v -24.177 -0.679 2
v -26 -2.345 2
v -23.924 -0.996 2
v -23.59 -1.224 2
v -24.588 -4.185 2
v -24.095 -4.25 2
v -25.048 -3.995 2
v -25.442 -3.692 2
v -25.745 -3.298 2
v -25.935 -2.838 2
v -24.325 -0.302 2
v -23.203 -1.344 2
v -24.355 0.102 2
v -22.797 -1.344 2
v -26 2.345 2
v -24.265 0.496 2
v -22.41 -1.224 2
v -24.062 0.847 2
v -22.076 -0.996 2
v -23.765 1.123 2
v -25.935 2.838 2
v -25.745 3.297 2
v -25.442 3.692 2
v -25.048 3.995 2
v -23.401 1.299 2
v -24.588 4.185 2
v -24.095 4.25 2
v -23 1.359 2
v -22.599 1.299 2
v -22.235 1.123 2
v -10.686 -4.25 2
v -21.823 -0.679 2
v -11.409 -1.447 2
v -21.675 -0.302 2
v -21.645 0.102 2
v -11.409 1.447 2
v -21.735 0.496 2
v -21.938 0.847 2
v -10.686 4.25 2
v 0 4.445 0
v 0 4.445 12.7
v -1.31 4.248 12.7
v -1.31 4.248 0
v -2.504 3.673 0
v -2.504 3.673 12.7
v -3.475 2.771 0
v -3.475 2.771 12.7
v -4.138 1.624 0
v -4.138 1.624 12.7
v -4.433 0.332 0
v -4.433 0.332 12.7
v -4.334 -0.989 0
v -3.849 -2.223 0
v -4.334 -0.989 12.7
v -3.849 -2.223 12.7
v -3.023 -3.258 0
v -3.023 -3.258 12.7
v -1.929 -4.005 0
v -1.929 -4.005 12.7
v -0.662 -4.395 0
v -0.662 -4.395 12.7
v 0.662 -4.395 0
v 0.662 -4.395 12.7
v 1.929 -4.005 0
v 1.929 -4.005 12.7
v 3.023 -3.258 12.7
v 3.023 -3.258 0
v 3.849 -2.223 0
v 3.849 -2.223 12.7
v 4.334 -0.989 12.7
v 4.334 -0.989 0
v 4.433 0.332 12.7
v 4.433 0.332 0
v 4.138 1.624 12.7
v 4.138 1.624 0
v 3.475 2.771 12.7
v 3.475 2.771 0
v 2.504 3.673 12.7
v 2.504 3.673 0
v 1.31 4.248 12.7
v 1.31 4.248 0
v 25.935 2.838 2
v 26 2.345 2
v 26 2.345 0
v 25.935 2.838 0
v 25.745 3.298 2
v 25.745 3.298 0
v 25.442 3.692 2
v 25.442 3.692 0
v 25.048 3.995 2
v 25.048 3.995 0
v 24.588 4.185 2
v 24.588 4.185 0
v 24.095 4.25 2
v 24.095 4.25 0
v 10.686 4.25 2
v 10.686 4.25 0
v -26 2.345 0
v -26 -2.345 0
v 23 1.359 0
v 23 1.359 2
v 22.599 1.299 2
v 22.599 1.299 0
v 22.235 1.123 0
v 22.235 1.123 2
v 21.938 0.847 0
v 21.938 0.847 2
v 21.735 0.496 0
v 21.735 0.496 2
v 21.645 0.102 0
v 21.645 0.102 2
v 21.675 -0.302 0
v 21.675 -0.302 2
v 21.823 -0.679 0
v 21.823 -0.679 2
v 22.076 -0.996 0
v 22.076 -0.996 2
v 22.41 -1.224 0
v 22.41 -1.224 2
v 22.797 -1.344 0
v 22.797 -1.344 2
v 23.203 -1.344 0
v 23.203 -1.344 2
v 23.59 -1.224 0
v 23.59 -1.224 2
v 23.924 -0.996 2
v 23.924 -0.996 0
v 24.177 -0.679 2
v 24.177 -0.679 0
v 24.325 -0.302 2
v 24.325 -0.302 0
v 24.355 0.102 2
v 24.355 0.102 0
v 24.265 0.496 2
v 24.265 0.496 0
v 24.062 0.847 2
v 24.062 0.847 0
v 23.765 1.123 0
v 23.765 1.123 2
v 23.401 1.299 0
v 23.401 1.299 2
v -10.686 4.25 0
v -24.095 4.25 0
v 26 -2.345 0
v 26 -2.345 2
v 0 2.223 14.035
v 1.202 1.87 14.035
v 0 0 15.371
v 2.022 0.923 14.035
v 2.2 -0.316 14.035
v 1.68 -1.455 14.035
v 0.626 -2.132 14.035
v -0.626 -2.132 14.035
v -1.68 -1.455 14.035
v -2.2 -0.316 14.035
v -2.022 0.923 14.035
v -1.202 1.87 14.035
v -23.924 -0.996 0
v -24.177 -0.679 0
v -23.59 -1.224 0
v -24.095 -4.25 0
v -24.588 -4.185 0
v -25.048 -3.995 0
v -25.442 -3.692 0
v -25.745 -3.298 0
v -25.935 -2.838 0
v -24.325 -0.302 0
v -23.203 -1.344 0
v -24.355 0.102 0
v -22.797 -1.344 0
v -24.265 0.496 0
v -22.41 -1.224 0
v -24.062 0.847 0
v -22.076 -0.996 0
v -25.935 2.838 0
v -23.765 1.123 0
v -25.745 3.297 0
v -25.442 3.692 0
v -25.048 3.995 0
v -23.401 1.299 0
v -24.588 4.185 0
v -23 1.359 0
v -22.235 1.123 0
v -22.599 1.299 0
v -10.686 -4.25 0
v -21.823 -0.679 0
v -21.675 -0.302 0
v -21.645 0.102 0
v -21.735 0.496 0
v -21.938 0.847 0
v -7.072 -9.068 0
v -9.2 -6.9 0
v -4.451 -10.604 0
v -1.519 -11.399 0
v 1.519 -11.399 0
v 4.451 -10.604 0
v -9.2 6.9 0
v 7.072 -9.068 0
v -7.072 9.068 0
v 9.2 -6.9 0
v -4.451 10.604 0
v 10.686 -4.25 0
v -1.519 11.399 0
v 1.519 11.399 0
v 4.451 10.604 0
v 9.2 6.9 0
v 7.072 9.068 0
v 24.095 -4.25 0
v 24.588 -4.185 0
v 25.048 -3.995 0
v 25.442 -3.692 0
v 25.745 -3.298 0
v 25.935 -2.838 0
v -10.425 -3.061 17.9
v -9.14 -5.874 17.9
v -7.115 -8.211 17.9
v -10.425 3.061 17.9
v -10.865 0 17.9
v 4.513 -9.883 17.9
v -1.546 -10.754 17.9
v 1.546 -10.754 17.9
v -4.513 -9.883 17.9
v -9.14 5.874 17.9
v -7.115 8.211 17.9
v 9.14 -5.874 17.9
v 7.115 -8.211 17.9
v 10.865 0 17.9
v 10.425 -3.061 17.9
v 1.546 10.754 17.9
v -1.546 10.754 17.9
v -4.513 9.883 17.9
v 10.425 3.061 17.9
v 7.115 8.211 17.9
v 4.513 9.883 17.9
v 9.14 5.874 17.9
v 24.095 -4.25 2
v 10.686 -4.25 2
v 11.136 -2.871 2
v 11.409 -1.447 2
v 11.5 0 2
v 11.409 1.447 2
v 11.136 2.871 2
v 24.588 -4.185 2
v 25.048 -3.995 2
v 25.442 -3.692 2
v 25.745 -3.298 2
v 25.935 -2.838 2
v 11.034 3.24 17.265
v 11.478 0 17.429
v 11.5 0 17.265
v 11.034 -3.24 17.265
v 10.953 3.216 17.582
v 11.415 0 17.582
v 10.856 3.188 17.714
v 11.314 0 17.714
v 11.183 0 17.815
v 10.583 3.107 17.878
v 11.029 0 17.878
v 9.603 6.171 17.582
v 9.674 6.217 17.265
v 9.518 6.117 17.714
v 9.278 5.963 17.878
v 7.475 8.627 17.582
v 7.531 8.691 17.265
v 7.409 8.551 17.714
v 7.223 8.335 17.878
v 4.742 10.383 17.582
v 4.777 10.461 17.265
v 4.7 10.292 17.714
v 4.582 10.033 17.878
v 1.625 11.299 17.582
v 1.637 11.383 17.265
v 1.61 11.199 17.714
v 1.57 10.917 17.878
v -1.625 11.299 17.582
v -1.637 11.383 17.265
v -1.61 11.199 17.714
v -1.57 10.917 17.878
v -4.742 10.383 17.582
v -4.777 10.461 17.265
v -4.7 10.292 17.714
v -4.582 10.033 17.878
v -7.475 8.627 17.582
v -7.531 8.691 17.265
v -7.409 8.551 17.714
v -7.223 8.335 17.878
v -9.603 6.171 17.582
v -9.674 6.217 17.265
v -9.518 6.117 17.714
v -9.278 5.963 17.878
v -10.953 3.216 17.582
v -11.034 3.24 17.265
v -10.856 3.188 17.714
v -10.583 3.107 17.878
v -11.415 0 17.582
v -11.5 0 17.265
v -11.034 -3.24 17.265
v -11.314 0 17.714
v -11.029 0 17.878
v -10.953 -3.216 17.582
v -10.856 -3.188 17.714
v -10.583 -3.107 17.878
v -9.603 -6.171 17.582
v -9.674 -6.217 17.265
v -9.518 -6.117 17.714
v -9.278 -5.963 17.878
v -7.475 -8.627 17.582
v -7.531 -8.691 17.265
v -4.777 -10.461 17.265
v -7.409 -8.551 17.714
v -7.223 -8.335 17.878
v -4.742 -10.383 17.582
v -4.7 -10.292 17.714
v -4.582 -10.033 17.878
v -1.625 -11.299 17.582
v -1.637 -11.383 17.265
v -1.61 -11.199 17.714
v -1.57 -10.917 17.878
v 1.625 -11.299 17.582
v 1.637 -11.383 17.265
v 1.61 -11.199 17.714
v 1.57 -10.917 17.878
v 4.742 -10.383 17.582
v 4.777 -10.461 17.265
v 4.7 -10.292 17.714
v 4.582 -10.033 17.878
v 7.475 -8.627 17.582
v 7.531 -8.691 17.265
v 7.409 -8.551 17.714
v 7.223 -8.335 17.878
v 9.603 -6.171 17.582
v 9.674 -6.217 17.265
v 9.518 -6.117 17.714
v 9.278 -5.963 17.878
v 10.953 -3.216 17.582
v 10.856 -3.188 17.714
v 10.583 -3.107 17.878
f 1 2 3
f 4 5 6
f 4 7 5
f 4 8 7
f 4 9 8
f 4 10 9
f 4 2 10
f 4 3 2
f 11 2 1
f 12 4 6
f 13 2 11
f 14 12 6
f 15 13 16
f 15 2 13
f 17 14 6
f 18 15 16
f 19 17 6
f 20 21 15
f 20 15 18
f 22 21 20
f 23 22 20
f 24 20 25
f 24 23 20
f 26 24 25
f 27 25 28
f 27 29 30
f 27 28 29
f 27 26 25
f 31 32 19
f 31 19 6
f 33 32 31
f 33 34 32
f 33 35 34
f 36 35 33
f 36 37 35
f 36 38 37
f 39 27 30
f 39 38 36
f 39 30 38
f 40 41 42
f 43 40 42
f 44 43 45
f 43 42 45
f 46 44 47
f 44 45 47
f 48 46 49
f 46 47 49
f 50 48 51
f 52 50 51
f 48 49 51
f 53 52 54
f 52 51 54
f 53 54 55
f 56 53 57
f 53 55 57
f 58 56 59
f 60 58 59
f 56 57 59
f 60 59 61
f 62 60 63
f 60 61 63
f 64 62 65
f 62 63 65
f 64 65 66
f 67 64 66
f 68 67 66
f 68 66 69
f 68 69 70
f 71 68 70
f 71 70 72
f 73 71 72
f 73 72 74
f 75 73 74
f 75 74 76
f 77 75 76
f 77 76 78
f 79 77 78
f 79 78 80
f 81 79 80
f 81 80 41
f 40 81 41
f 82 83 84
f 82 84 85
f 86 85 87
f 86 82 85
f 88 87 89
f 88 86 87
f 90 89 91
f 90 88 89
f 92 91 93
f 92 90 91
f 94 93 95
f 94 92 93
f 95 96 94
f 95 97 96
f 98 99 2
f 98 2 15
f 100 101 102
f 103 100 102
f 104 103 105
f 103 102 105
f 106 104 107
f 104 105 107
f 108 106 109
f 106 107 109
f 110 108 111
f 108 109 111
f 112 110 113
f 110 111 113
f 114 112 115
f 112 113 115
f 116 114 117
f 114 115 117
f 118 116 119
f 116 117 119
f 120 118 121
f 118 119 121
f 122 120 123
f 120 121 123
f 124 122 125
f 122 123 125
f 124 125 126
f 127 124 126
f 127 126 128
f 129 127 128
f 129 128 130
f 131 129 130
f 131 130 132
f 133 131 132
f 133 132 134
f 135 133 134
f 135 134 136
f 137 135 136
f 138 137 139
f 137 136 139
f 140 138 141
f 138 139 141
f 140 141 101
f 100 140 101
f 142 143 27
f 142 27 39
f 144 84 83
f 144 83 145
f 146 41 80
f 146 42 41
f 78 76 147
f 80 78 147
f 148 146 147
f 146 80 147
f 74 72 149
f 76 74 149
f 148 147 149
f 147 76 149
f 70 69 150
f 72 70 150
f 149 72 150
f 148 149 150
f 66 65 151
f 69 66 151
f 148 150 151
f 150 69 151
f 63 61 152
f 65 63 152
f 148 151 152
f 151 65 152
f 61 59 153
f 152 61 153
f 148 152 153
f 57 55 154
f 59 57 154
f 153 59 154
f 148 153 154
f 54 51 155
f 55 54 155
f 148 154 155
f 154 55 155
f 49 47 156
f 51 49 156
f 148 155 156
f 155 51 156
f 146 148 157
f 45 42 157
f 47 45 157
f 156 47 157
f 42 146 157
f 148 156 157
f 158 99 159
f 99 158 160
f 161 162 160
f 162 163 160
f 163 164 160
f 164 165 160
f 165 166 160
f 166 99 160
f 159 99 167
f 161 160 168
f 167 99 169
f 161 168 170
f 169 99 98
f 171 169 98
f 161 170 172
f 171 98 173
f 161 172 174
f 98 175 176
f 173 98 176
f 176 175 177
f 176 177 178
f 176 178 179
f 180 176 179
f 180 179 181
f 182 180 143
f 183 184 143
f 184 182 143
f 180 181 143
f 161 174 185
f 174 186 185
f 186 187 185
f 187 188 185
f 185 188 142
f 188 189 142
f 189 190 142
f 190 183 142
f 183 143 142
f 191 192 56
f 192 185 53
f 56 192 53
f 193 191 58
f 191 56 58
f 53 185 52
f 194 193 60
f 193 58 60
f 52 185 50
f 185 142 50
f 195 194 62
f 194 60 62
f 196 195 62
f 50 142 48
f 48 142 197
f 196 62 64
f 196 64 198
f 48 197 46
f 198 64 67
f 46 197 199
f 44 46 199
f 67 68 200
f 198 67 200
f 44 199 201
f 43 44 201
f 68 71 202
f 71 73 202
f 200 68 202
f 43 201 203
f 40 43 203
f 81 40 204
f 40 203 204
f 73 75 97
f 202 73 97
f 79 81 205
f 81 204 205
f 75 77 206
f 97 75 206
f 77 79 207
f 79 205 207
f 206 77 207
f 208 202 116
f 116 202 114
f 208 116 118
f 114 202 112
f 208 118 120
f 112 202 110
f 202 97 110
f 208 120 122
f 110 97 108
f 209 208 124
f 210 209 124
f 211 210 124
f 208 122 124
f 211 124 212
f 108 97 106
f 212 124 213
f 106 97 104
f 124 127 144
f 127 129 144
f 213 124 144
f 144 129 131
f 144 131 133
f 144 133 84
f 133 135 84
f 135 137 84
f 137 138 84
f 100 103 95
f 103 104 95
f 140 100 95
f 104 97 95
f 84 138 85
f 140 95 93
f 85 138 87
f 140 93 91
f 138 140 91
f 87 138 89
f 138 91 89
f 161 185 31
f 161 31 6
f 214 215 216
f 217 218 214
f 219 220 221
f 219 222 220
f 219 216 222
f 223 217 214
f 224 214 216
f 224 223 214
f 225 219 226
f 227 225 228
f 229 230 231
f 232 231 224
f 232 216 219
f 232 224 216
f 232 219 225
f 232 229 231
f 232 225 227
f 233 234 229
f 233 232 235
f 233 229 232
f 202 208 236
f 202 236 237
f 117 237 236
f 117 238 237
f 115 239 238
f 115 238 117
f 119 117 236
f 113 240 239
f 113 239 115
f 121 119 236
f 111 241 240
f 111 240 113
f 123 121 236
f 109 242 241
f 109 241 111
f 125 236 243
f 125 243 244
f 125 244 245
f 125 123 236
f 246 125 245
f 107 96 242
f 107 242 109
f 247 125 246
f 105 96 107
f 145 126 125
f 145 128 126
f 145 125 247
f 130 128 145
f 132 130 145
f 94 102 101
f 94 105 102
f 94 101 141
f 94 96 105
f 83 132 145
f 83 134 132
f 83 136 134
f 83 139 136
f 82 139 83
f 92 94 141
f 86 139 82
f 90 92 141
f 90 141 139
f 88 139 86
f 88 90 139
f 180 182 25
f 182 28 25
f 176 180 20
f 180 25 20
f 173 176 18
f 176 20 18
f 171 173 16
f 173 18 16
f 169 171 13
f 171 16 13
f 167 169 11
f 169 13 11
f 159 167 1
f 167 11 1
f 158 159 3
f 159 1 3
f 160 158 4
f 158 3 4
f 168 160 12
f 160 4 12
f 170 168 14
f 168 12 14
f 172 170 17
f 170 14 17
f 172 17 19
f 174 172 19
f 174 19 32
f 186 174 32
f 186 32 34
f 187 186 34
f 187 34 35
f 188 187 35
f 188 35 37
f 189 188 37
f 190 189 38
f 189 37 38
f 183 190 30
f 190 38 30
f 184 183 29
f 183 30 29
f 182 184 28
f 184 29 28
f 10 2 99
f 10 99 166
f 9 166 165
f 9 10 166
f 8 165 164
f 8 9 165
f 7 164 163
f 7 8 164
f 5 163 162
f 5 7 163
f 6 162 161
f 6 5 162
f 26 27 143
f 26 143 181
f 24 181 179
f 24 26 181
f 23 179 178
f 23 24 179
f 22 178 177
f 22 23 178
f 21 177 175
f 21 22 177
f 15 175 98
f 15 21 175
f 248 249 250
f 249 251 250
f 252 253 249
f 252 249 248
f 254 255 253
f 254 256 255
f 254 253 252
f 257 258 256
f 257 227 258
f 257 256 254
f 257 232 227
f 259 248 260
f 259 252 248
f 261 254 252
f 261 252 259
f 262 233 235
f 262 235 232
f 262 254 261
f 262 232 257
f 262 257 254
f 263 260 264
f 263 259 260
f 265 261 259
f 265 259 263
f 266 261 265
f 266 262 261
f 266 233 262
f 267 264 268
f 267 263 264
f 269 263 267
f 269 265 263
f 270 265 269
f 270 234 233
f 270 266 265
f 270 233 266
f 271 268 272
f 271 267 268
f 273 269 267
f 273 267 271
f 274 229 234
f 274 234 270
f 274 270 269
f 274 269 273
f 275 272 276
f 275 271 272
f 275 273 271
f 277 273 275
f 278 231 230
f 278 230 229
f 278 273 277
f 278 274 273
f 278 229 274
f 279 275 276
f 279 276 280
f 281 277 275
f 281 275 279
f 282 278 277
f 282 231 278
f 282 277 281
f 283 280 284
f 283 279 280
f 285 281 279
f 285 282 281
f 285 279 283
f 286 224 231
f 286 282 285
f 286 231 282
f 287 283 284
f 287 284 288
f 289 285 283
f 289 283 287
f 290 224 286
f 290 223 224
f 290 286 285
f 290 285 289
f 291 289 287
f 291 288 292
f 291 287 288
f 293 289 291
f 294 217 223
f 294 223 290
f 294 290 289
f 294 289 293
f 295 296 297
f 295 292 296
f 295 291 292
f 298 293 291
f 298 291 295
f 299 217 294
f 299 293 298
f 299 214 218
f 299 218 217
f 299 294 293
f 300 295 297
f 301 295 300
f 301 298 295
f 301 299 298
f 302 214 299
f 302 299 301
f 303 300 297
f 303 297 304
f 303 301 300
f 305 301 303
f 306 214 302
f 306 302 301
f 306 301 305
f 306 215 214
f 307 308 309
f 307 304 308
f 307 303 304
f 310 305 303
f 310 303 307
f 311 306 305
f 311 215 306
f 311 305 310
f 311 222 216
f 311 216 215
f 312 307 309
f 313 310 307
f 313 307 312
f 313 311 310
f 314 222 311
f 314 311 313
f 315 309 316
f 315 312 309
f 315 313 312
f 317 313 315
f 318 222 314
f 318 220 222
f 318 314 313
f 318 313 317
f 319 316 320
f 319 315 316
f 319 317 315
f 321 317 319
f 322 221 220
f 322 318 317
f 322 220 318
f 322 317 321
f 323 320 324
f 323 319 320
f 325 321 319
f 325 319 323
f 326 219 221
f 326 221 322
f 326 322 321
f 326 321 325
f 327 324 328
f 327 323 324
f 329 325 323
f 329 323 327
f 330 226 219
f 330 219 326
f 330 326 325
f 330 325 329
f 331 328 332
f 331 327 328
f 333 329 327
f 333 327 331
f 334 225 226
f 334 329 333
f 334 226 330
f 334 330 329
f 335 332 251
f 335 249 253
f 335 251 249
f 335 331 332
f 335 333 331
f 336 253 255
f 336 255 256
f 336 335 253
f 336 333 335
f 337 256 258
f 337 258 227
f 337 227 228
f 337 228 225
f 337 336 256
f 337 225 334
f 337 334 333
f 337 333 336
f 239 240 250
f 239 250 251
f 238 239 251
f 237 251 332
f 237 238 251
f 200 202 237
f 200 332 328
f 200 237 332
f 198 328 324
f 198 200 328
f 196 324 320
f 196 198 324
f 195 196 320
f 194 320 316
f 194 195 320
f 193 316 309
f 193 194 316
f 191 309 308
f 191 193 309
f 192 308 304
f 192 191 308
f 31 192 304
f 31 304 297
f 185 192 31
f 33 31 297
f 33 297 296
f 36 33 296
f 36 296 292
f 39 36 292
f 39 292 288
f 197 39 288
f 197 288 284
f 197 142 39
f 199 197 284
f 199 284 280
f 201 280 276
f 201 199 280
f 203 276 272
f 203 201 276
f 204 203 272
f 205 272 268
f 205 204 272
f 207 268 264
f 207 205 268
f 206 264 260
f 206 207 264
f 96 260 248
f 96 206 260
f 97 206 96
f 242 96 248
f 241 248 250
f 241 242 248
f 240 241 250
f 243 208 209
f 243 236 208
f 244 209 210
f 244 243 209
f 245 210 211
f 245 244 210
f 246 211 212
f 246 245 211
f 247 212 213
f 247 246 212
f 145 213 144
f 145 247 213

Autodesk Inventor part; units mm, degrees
ref_plane "YZ Plane" through (0, 0, 0) normal (1, 0, 0) x (0, 1, 0)
ref_plane "XZ Plane" through (0, 0, 0) normal (0, 1, 0) x (-1, 0, 0)
ref_plane "XY Plane" through (0, 0, 0) normal (0, 0, 1) x (1, 0, 0)
sketch "Sketch1" plane through (0, 0, 0) normal (0, 0, 1) x (1, 0, 0)
  circle A0 centre (0, 0) radius 11.5
  line L0 (-26, 4.25) -> (26, 4.25)
  line L1 (26, 4.25) -> (26, -4.25)
  line L2 (26, -4.25) -> (-26, -4.25)
  line L3 (-26, -4.25) -> (-26, 4.25)
  point P0 (-26, 0)
  point P1 (0, 4.25)
  dimension "d0" = 23
  dimension "d1" = 52
  dimension "d2" = 8.5
extrude "Extrusion1" add sketch "Sketch1" along normal blind 2 contours A0 L2 L0 | A0 L0 L1 L2 | A0 L2 L3 L0
extrude "Extrusion2" add sketch "Sketch1" along normal blind 17.9 contours A0 L2 L0 | L0 A0 | A0 L2
sketch "Sketch2" plane through (0, 0, 0) normal (0, 0, 1) x (1, 0, 0)
  line L0 (-27.9259, 0) -> (33.5172, 0) construction
  point P0 (0, 0)
  point P1 (-23, 0)
  point P2 (23, 0)
  dimension "d7" = 0
  dimension "d8" = 23
  dimension "d9" = 23
hole "Hole1" at (-23, 0, 0) at (23, 0, 0) direction (0, 0, 1) diameter 2.7178 end through all
fillet "Fillet1" radius 1.905 4 edges at (-26, -4.25, 1) (26, -4.25, 1) (26, 4.25, 1) (-26, 4.25, 1)
fillet "Fillet2" radius 0.635 1 edges at (-11.5, 0, 17.9)
hole "Hole2" at (0, 0, 0) direction (0, 0, 1) diameter 8.89 depth 12.7 tip angle 118
properties material "FR4"
